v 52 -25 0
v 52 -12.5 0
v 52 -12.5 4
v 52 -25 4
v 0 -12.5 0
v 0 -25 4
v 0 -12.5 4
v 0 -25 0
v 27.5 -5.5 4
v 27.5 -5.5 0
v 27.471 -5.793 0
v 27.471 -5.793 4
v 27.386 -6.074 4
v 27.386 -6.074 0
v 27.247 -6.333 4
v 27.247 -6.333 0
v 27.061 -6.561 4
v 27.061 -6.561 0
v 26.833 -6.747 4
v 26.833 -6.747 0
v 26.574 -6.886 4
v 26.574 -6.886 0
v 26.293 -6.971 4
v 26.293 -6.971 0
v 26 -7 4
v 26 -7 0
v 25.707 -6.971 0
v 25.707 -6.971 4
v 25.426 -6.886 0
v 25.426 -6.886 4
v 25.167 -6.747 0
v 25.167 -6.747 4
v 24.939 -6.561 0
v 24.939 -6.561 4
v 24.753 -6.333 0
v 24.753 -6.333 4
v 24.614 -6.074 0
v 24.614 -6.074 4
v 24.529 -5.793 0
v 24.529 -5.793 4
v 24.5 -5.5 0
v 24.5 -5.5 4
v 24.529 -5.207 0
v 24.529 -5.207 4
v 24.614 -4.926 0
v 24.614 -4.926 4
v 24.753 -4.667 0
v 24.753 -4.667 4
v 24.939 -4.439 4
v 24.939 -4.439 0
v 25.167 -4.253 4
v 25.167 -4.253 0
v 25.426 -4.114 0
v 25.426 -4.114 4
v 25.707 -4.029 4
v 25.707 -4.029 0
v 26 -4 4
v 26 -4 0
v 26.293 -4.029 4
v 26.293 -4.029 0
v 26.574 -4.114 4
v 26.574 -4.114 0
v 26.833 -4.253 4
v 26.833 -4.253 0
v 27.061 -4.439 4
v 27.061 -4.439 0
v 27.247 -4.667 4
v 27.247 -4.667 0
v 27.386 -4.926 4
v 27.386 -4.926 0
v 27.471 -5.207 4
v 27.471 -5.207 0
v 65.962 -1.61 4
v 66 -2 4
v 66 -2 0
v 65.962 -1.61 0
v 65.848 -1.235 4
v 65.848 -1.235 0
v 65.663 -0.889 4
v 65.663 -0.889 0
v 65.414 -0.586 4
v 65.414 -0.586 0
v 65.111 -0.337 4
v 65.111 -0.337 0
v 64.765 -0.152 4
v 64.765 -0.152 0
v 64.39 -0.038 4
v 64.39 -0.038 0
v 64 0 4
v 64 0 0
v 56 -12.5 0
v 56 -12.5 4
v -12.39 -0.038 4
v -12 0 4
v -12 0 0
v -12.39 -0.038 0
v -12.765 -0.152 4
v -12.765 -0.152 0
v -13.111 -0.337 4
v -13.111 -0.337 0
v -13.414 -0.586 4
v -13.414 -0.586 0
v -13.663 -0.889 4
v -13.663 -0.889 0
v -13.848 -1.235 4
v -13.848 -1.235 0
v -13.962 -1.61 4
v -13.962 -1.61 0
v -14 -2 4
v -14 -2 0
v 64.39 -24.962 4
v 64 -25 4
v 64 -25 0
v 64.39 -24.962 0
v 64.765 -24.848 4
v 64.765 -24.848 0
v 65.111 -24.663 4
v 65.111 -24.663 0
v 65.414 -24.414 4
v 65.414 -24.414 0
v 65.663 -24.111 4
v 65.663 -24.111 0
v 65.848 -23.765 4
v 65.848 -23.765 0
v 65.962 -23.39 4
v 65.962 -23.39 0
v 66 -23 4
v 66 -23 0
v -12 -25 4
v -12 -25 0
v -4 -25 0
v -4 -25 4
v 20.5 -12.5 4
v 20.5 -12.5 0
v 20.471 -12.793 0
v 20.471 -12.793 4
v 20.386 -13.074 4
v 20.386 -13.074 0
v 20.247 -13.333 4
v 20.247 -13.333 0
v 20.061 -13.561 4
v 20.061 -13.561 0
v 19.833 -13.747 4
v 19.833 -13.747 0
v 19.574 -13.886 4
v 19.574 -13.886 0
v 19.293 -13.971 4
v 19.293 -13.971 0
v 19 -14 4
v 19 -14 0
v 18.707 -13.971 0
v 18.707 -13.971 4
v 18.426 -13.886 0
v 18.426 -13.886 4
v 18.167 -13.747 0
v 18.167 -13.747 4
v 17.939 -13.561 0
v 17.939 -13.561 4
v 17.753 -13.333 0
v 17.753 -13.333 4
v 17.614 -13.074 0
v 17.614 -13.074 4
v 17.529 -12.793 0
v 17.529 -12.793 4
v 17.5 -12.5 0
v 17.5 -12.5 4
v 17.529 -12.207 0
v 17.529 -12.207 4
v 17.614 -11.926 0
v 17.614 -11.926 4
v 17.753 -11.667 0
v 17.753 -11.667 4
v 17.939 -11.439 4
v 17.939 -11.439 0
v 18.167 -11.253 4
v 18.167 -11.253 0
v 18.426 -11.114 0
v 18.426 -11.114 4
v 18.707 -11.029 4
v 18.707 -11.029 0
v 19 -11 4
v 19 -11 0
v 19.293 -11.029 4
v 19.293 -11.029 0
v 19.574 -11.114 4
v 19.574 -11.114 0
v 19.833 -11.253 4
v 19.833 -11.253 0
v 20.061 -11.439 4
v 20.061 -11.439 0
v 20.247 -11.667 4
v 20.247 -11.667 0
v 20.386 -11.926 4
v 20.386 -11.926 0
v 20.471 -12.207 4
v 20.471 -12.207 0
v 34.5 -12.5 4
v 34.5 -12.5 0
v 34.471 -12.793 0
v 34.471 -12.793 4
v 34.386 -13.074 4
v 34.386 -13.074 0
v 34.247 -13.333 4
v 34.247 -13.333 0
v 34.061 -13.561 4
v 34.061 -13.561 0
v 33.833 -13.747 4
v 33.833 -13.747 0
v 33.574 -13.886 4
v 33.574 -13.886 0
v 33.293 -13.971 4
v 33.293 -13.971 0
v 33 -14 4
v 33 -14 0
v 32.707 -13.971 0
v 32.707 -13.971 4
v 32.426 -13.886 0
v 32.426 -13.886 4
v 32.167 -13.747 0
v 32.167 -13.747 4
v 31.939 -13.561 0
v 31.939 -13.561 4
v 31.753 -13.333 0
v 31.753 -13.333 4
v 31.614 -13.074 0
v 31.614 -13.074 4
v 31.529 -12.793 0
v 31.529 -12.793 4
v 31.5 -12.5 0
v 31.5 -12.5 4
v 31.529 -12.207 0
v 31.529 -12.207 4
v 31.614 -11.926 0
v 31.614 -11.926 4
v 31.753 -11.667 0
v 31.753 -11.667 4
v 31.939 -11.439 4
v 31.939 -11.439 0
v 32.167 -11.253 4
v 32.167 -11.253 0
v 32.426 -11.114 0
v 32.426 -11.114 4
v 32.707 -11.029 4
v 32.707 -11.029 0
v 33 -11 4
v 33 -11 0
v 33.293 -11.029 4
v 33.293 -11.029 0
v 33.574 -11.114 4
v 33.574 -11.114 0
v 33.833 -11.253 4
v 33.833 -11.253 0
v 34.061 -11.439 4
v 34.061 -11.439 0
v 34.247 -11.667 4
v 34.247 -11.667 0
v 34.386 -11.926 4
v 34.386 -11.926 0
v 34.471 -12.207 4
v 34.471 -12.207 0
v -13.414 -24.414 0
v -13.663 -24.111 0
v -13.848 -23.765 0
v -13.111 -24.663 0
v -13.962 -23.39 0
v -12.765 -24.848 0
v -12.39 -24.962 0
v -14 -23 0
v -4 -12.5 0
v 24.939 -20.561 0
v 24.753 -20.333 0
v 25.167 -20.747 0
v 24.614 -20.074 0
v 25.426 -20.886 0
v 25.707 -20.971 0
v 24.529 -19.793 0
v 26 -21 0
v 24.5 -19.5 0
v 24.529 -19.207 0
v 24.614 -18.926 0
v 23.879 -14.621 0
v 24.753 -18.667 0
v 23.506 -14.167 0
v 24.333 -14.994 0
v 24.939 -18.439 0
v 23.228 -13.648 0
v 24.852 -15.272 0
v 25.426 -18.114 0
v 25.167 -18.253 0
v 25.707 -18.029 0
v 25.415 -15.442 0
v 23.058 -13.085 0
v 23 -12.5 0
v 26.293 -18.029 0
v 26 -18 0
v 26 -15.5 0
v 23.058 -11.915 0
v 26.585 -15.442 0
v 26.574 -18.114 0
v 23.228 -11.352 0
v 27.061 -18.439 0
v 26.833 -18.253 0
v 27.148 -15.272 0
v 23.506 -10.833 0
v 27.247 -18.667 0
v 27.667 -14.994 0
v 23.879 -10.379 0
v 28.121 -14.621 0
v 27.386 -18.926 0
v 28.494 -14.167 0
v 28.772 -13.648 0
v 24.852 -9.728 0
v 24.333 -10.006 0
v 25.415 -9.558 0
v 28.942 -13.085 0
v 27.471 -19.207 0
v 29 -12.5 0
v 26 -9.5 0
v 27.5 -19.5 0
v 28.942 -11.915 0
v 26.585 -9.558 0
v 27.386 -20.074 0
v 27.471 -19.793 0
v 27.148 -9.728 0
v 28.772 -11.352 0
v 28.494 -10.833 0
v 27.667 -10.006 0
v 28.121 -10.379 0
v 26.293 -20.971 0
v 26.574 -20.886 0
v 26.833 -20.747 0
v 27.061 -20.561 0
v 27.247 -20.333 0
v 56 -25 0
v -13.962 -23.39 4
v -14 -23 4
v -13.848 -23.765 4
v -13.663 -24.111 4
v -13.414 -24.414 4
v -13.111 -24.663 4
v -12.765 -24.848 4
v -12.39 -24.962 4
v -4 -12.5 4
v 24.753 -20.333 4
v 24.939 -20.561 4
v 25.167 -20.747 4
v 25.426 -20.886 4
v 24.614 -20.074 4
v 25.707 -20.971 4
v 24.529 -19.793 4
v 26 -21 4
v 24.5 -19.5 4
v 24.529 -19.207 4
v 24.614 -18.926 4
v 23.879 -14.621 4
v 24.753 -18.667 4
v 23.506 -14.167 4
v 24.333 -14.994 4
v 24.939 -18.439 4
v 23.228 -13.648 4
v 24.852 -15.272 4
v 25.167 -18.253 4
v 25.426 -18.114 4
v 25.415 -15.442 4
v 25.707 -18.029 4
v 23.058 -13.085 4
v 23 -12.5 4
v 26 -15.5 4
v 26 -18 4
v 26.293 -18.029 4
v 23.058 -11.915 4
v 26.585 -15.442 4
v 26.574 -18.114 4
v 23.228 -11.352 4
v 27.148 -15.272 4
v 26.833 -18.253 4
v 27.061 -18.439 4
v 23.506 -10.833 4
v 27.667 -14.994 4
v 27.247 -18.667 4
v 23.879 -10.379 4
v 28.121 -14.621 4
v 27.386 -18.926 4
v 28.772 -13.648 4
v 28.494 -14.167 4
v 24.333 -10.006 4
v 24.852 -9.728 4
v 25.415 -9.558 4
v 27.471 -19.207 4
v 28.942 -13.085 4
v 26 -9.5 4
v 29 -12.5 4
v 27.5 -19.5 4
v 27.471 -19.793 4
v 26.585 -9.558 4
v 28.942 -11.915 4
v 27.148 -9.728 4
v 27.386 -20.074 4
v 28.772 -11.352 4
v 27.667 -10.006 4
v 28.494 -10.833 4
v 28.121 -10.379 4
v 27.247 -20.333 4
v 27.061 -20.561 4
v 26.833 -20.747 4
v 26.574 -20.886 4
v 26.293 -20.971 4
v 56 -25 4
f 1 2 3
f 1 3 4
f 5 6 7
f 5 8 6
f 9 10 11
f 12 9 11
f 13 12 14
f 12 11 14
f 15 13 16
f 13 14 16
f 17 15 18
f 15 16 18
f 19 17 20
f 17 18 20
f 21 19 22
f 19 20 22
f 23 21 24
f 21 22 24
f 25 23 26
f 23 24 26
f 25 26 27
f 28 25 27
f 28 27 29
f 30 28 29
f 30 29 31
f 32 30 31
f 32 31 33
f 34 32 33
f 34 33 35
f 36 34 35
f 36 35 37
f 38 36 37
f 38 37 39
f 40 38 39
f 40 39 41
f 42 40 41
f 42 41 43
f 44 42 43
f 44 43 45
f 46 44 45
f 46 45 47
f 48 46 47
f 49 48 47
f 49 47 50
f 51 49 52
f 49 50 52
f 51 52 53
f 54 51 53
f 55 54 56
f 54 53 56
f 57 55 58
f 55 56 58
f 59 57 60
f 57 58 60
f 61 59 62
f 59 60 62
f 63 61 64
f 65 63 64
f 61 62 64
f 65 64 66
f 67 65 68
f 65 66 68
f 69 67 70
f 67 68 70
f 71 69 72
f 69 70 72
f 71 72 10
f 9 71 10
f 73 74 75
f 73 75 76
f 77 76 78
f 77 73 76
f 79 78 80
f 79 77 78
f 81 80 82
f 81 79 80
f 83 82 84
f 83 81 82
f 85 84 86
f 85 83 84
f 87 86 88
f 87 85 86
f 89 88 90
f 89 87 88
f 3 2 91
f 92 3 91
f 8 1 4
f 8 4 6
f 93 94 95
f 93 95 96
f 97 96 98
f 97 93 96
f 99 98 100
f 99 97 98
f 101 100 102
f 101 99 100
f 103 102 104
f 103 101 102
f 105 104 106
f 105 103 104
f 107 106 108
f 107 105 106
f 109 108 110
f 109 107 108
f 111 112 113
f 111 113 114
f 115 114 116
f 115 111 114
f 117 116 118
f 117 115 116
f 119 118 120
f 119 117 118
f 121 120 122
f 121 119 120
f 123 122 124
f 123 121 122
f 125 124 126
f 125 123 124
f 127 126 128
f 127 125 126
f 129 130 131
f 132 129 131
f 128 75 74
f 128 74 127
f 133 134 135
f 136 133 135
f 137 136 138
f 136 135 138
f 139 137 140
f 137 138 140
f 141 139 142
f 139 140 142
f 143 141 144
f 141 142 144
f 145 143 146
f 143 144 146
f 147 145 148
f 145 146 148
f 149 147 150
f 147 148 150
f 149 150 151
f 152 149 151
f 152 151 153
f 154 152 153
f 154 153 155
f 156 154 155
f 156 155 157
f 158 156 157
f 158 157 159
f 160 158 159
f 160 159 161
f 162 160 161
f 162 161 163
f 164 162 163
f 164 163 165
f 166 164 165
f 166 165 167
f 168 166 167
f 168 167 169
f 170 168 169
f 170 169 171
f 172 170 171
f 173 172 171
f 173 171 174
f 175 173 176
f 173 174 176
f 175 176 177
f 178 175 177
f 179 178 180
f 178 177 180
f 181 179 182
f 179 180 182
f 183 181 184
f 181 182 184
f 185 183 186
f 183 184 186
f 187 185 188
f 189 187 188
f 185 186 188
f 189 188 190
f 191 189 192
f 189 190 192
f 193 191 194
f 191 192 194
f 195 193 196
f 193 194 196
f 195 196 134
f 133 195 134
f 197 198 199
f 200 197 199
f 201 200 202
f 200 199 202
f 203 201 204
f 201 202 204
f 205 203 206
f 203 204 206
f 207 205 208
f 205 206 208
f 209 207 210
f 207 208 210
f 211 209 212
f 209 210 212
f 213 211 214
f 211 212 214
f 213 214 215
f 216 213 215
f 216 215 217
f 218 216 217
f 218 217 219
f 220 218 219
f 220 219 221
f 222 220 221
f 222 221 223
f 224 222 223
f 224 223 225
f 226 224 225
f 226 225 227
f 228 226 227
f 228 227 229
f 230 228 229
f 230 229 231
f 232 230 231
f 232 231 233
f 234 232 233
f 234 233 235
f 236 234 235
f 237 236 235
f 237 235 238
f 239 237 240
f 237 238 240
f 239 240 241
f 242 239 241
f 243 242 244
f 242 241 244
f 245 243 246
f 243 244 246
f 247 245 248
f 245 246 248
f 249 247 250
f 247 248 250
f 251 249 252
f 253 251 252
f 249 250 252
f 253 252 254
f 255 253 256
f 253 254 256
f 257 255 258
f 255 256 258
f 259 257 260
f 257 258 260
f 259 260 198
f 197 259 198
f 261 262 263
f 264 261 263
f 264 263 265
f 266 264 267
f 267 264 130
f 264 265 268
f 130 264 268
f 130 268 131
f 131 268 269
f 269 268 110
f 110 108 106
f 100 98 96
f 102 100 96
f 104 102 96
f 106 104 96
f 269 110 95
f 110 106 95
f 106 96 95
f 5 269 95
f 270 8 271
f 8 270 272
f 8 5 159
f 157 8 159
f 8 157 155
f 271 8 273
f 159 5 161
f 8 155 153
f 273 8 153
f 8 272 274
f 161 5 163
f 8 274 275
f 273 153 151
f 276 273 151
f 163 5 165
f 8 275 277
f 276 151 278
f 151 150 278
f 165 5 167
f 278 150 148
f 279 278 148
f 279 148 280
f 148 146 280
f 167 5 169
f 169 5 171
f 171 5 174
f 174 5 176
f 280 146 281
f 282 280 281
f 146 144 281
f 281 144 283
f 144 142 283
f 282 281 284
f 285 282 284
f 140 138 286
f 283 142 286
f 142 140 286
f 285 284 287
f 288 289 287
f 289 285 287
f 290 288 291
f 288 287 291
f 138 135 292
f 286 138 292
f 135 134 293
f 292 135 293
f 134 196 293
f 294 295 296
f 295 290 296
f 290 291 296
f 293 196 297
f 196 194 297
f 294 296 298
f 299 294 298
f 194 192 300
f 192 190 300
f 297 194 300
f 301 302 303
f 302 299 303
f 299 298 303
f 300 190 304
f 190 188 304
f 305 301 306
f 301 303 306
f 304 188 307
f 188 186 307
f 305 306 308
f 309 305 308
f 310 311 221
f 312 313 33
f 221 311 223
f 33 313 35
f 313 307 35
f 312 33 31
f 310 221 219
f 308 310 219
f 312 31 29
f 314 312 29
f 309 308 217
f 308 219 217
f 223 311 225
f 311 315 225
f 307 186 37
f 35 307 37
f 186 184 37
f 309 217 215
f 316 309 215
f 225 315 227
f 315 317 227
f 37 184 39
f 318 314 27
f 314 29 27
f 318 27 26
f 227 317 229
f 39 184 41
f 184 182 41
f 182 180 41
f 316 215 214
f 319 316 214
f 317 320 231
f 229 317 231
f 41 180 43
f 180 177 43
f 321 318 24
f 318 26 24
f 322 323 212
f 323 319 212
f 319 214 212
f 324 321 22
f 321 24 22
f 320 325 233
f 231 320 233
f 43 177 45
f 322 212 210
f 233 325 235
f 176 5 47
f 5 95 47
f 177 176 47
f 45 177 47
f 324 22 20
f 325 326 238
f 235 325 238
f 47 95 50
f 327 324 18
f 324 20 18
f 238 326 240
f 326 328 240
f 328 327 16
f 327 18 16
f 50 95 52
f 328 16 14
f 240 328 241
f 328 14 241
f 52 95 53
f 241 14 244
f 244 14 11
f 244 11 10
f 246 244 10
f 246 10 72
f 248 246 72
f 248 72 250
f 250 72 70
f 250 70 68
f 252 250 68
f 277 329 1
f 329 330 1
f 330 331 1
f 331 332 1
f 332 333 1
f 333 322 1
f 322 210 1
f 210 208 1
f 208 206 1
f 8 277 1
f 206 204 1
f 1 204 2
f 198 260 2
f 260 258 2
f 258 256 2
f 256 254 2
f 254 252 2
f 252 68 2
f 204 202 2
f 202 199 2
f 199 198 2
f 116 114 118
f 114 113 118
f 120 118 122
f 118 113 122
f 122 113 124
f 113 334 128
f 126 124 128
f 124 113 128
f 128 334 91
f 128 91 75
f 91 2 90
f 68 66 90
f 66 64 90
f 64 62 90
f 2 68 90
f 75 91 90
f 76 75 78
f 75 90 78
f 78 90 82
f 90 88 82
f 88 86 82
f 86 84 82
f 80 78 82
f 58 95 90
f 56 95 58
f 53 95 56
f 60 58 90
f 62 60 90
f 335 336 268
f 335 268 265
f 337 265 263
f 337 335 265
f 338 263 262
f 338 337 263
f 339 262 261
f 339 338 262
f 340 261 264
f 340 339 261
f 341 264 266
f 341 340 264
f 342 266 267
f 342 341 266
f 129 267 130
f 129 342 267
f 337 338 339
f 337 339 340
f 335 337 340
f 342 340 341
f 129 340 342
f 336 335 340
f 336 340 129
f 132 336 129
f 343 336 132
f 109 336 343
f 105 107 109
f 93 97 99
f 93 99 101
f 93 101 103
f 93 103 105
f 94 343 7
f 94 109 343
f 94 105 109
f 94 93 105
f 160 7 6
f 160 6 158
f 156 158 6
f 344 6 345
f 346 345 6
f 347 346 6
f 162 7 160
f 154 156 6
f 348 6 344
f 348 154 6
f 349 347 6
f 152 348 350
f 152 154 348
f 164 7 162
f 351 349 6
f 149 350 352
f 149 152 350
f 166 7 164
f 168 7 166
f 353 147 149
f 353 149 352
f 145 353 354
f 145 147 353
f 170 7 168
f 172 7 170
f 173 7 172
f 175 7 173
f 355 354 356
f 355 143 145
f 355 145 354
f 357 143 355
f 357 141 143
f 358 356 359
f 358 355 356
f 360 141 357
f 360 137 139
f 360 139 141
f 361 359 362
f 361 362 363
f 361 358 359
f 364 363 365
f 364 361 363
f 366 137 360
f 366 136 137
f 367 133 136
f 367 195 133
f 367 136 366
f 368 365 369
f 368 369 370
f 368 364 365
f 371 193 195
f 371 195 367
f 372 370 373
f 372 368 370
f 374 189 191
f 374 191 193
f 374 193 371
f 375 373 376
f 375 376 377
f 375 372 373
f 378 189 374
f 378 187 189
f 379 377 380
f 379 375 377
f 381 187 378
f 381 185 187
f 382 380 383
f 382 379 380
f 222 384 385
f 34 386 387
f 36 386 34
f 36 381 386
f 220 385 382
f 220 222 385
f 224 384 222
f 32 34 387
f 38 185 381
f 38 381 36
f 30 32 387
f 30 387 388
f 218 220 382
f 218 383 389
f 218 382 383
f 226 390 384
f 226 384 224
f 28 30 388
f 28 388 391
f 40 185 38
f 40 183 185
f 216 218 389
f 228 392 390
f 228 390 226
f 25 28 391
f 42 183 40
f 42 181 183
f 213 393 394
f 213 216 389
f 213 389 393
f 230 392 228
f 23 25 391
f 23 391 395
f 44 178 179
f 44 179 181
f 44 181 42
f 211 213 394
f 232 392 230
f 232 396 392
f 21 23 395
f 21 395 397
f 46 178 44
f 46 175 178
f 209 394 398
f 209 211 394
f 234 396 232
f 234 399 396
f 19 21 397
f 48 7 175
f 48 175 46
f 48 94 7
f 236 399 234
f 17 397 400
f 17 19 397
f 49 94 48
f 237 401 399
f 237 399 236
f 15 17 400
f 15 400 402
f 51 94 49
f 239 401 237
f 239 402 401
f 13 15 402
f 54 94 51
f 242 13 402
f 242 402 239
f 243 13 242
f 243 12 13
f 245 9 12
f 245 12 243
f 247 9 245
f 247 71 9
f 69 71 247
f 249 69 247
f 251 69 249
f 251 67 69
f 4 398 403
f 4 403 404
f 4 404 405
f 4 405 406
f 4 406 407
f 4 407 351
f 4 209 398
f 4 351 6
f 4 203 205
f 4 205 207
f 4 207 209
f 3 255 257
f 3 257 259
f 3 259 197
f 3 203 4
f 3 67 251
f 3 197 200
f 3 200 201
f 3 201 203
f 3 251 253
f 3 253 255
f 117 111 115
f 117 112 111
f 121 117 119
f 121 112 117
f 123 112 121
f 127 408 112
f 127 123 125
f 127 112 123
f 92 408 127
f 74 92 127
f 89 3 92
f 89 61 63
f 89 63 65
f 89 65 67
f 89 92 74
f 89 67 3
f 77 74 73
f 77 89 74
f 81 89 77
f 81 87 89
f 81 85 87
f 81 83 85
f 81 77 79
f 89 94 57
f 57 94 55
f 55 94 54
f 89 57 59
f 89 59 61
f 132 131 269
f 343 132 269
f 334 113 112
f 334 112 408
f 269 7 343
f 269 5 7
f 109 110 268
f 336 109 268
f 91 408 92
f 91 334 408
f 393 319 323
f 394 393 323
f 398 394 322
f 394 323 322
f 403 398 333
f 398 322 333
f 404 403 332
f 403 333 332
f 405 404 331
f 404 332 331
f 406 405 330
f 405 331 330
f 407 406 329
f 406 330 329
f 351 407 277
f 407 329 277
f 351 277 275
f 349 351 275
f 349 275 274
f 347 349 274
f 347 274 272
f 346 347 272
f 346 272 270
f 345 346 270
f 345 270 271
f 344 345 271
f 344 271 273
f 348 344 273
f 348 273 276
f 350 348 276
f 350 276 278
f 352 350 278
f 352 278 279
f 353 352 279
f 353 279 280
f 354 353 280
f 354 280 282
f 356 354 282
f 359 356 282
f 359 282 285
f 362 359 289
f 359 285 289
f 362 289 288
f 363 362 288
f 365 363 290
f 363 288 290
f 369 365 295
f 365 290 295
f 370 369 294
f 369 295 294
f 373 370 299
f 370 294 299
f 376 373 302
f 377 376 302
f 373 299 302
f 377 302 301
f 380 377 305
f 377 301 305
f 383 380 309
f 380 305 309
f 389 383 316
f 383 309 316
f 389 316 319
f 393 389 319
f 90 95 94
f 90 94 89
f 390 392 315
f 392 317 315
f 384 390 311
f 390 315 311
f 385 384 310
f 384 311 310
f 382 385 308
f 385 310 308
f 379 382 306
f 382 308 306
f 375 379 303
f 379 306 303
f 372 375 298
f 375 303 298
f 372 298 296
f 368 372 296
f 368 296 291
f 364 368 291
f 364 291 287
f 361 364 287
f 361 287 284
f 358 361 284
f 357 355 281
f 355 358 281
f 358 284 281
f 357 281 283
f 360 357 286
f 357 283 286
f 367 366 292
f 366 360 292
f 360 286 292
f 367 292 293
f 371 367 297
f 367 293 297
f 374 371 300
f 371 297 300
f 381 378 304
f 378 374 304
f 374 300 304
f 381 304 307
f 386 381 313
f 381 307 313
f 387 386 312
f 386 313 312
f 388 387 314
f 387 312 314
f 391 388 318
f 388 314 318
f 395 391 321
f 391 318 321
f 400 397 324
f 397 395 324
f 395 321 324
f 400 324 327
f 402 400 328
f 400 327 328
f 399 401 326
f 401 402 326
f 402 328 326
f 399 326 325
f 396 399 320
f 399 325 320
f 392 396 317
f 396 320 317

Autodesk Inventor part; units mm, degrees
ref_plane "YZ Plane" through (0, 0, 0) normal (1, 0, 0) x (0, 1, 0)
ref_plane "XZ Plane" through (0, 0, 0) normal (0, 1, 0) x (-1, 0, 0)
ref_plane "XY Plane" through (0, 0, 0) normal (0, 0, 1) x (1, 0, 0)
sketch "Эскиз1" plane through (0, 0, 0) normal (0, 0, 1) x (1, 0, 0)
  line L0 (0, 0) -> (52, 0)
  line L1 (52, 0) -> (52, -25)
  line L2 (52, -25) -> (0, -25)
  line L3 (0, -25) -> (0, 0)
  line L4 (0, -12.5) -> (-4, -12.5)
  line L5 (-4, -12.5) -> (-4, 0)
  line L6 (-4, 0) -> (0, 0)
  line L7 (0, 0) -> (0, -12.5)
  line L8 (-4, 0) -> (-14, 0)
  line L9 (-14, 0) -> (-14, -25)
  line L10 (-14, -25) -> (-4, -25)
  line L11 (-4, -25) -> (-4, 0)
  line L12 (52, -12.5) -> (56, -12.5)
  line L13 (56, -12.5) -> (56, 0)
  line L14 (56, 0) -> (52, 0)
  line L15 (52, 0) -> (52, -12.5)
  line L16 (56, 0) -> (66, 0)
  line L17 (66, 0) -> (66, -25)
  line L18 (66, -25) -> (56, -25)
  line L19 (56, -25) -> (56, 0)
  circle A0 centre (26, -12.5) radius 3
  circle A1 centre (26, -12.5) radius 7
  circle A2 centre (33, -12.5) radius 1.5
  circle A3 centre (19, -12.5) radius 1.5
  circle A4 centre (26, -5.5) radius 1.5
  circle A5 centre (26, -19.5) radius 1.5
  dimension "d0" = 52
  dimension "d1" = 25
  dimension "d2" = 4
  dimension "d3" = 10
  dimension "d4" = 4
  dimension "d5" = 10
  dimension "d9" = 6
  dimension "d10" = 14
  dimension "d11" = 3
  dimension "d12" = 3
  dimension "d13" = 3
  dimension "d14" = 3
extrude "Выдавливание1" add sketch "Эскиз1" along normal blind 4 contours L0 L1 L2 L3 | L3 L4 L5 L6 | L14 L13 L12 L1 | L5 L11 L10 L9 L8 | L16 L17 L18 L19 L13 | A2 A1 A5 A3 A4
fillet "Сопряжение1" radius 2 4 edges at (66, 0, 2) (66, -25, 2) (-14, -25, 2) (-14, 0, 2)
properties material "Дерево (вишня)"
